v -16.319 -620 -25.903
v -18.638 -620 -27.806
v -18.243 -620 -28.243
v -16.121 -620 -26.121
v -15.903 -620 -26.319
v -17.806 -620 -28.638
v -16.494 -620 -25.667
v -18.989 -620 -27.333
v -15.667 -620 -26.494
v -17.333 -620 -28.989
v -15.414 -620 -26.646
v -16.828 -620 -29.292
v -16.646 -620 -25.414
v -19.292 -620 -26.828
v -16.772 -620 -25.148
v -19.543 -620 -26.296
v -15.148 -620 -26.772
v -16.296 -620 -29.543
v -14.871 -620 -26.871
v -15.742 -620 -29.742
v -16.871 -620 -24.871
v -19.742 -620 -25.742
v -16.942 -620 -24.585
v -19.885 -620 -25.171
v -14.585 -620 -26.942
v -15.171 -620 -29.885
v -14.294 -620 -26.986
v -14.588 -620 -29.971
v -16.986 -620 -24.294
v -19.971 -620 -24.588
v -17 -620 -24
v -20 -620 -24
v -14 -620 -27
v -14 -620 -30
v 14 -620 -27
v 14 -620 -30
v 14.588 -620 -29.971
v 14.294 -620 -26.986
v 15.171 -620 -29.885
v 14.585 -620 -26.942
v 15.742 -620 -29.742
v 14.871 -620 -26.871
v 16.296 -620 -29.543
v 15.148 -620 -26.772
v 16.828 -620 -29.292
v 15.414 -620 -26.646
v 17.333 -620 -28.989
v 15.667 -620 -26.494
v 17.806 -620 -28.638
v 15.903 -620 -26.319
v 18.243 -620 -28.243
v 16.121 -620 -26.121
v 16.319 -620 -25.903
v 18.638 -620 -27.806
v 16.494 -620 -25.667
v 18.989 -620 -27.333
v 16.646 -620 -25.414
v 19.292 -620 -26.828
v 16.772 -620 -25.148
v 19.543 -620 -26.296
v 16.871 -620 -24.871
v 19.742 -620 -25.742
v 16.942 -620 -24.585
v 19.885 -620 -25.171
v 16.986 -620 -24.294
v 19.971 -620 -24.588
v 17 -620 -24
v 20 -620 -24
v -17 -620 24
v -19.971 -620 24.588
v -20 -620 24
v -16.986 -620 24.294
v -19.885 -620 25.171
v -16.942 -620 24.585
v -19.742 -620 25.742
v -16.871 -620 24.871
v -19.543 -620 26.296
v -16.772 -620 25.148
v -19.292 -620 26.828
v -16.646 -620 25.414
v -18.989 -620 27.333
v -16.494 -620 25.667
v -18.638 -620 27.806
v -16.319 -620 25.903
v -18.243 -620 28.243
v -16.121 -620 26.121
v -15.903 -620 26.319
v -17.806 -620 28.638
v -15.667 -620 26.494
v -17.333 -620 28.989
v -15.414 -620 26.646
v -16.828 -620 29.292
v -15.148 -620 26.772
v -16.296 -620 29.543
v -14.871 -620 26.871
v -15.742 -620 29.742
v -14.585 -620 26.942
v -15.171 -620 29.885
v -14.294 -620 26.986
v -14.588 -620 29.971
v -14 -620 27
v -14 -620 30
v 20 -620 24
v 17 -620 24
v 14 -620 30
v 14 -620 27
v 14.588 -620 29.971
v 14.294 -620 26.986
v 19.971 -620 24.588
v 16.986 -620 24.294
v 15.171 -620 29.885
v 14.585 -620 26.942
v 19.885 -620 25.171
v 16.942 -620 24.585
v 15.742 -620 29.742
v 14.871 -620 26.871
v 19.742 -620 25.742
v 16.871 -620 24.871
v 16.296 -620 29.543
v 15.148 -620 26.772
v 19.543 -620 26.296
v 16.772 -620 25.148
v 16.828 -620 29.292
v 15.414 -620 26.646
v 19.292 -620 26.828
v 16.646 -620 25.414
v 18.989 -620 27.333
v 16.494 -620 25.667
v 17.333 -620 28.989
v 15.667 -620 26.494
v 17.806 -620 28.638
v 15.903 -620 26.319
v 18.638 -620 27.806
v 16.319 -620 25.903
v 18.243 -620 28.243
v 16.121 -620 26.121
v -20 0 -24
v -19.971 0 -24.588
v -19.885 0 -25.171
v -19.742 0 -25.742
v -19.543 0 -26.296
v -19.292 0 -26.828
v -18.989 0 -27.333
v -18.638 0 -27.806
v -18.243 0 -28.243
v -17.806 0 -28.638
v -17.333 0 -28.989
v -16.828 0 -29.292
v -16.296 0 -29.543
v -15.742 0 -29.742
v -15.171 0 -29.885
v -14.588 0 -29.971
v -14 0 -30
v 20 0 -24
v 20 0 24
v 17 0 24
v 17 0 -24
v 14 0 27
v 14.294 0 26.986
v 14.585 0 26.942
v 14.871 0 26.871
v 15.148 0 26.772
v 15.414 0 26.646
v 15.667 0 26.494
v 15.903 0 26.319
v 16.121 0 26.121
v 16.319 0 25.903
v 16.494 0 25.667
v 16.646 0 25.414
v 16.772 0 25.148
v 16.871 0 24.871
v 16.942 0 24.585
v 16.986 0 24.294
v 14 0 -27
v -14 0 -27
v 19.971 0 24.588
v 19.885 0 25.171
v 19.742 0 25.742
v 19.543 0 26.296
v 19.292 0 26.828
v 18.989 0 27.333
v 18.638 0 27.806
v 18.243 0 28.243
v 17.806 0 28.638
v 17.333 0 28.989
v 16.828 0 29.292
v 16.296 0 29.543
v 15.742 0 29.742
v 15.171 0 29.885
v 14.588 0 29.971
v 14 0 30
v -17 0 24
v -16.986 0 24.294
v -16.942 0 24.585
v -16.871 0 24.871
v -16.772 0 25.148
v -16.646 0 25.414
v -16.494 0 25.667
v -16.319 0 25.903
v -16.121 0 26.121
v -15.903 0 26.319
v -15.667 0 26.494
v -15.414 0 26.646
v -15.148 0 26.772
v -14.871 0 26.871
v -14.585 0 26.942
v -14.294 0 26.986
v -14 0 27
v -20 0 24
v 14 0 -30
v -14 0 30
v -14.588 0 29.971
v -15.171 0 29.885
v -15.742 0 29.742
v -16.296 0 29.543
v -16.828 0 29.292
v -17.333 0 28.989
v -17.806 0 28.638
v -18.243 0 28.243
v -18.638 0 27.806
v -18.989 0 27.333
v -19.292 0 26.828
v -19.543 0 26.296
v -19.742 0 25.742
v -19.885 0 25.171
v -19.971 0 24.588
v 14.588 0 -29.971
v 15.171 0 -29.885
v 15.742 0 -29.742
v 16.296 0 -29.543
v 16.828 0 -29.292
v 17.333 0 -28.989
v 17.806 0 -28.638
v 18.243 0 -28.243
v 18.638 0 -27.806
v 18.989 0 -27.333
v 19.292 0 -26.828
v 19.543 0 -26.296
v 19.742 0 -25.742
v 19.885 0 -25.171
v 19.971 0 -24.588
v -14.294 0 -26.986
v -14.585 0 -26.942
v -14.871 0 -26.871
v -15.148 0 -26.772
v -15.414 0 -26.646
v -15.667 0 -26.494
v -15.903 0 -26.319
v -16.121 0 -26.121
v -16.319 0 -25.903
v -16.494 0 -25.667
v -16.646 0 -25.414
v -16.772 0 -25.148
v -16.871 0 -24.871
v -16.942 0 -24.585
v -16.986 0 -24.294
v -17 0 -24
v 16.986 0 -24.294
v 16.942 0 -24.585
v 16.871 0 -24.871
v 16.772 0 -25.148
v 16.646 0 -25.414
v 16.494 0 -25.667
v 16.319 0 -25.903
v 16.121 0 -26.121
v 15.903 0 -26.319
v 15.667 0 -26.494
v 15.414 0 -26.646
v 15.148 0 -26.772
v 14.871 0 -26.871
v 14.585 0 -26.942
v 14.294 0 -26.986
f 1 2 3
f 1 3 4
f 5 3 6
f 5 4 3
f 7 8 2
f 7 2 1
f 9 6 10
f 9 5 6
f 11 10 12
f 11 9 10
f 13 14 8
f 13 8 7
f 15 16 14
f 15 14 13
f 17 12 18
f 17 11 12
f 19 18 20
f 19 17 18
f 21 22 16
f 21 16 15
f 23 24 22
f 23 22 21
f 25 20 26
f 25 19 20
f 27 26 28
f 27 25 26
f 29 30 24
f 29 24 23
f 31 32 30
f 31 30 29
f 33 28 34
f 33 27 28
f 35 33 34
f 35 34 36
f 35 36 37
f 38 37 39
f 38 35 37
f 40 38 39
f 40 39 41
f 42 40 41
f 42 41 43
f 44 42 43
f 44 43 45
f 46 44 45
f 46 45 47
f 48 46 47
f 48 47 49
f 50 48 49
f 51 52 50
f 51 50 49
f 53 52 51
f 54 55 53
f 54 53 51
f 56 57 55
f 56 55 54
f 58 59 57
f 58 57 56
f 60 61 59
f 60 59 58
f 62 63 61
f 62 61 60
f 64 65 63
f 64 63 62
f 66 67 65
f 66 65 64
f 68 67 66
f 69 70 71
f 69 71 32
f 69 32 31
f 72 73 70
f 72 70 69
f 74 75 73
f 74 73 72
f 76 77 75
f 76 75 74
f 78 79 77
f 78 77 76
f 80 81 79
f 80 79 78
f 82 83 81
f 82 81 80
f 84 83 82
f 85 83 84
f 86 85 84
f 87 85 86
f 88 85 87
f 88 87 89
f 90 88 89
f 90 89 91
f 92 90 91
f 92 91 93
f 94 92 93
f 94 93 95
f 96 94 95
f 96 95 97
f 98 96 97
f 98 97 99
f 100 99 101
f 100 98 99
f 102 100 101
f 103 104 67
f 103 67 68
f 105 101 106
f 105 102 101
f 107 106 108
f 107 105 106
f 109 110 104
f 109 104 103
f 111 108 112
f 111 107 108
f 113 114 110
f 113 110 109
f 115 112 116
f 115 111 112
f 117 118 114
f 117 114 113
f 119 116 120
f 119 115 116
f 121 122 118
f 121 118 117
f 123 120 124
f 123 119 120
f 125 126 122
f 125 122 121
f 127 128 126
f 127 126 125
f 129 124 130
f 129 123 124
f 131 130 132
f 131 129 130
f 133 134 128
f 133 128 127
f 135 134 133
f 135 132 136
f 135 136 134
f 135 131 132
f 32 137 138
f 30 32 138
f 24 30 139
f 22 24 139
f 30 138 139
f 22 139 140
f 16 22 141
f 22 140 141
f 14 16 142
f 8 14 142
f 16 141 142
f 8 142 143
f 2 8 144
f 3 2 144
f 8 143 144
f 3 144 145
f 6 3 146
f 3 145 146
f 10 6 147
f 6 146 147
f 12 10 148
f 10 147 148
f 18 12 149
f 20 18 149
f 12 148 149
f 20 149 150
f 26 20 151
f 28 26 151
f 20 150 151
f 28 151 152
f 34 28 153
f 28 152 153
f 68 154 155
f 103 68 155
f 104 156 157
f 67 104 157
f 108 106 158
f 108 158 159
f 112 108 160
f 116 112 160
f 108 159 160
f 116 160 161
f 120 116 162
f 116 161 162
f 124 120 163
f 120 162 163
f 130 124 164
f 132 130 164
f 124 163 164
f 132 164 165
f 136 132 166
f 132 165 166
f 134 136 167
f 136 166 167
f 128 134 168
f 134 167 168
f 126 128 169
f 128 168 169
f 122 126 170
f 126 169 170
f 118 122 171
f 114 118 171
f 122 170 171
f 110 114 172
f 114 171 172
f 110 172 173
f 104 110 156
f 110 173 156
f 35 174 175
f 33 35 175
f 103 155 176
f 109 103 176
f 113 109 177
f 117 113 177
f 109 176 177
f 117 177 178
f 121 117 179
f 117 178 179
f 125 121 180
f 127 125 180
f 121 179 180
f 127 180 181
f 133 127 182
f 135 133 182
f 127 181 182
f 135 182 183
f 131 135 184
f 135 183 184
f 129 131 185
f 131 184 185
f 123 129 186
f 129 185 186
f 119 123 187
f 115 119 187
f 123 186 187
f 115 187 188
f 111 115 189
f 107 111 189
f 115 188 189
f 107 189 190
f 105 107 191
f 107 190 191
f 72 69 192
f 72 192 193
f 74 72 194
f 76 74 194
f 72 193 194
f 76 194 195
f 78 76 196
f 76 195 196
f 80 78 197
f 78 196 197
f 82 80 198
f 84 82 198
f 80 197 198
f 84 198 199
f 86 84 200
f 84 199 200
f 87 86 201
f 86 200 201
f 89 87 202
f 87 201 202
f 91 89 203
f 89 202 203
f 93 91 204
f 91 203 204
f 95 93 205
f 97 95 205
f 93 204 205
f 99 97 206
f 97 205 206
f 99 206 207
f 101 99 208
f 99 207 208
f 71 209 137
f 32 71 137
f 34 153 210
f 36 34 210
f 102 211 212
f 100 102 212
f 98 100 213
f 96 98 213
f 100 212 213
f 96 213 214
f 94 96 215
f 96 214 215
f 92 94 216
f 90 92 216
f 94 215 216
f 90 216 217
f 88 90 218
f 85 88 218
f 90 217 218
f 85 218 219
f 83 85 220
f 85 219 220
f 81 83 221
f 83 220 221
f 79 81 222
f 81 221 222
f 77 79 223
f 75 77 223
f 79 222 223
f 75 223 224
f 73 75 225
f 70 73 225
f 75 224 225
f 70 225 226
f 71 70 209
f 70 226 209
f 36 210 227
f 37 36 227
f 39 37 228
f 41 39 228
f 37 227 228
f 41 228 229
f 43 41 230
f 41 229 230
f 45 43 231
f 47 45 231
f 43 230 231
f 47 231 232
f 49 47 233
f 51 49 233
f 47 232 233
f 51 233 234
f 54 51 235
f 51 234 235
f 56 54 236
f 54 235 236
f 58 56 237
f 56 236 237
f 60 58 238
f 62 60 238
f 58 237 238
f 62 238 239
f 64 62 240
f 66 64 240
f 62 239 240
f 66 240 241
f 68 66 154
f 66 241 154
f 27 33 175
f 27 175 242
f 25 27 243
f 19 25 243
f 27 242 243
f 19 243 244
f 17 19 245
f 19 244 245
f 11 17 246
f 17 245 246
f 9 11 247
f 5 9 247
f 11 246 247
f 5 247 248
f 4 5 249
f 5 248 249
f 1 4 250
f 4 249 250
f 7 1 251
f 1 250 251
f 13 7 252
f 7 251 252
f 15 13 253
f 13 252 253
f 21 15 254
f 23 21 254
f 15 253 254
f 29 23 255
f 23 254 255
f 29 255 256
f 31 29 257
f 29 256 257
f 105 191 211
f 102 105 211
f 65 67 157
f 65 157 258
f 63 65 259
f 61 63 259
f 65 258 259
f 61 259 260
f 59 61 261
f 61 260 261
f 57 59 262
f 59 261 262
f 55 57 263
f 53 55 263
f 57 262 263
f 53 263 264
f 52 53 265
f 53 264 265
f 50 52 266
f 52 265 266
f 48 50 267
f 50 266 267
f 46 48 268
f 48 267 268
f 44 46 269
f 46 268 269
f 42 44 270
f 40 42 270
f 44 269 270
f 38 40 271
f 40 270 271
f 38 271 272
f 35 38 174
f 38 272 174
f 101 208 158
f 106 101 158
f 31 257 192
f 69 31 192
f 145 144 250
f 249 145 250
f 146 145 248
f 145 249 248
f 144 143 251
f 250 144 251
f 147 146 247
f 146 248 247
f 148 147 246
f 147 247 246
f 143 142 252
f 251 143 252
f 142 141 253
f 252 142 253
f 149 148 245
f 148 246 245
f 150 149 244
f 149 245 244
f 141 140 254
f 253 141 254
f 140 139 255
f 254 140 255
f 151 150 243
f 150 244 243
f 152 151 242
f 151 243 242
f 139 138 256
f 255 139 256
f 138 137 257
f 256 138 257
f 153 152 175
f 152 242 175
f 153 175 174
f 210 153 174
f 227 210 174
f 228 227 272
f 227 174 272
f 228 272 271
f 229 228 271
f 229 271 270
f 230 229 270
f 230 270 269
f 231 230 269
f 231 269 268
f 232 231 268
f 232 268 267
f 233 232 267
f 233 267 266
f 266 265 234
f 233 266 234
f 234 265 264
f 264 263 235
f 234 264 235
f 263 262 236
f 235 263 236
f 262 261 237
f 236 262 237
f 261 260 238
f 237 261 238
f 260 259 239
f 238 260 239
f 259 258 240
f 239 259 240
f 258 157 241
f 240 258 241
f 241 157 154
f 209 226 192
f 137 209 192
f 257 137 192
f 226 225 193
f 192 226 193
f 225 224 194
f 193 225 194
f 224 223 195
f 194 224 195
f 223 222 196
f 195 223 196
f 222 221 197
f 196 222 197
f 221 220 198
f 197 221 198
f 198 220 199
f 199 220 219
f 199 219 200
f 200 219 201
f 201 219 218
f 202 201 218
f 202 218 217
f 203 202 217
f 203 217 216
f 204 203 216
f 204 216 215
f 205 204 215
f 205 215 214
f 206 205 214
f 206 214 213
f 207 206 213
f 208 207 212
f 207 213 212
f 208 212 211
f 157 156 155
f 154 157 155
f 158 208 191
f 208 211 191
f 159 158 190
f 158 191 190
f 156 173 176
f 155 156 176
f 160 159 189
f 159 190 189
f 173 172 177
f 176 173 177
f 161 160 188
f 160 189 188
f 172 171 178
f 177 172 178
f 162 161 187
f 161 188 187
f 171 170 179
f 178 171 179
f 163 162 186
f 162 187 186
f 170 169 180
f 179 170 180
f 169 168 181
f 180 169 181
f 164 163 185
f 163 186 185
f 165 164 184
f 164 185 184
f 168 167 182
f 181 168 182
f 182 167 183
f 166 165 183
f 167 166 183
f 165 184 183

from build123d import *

# Parameters (mm, degrees)
F1_DEPTH = 620


with BuildPart() as f1:
    # F0 (on Front) → F1 (new body)
    with BuildSketch(Plane.XZ):
        with BuildLine():
            Line((14, 30), (-14, 30))
            ThreePointArc((-14, 30), (-18.242641, 28.242641), (-20, 24))
            Line((-20, 24), (-20, -24))
            ThreePointArc((-20, -24), (-18.242641, -28.242641), (-14, -30))
            Line((-14, -30), (14, -30))
            ThreePointArc((14, -30), (18.242641, -28.242641), (20, -24))
            Line((20, -24), (20, 24))
            ThreePointArc((20, 24), (18.242641, 28.242641), (14, 30))
        make_face()
        with BuildLine():
            Line((-17, -24), (-17, 24))
            ThreePointArc((-17, 24), (-16.12132, 26.12132), (-14, 27))
            Line((-14, 27), (14, 27))
            ThreePointArc((14, 27), (16.12132, 26.12132), (17, 24))
            Line((17, 24), (17, -24))
            ThreePointArc((17, -24), (16.12132, -26.12132), (14, -27))
            Line((14, -27), (-14, -27))
            ThreePointArc((-14, -27), (-16.12132, -26.12132), (-17, -24))
        make_face(mode=Mode.SUBTRACT)
    extrude(amount=F1_DEPTH)


solid = f1.part
